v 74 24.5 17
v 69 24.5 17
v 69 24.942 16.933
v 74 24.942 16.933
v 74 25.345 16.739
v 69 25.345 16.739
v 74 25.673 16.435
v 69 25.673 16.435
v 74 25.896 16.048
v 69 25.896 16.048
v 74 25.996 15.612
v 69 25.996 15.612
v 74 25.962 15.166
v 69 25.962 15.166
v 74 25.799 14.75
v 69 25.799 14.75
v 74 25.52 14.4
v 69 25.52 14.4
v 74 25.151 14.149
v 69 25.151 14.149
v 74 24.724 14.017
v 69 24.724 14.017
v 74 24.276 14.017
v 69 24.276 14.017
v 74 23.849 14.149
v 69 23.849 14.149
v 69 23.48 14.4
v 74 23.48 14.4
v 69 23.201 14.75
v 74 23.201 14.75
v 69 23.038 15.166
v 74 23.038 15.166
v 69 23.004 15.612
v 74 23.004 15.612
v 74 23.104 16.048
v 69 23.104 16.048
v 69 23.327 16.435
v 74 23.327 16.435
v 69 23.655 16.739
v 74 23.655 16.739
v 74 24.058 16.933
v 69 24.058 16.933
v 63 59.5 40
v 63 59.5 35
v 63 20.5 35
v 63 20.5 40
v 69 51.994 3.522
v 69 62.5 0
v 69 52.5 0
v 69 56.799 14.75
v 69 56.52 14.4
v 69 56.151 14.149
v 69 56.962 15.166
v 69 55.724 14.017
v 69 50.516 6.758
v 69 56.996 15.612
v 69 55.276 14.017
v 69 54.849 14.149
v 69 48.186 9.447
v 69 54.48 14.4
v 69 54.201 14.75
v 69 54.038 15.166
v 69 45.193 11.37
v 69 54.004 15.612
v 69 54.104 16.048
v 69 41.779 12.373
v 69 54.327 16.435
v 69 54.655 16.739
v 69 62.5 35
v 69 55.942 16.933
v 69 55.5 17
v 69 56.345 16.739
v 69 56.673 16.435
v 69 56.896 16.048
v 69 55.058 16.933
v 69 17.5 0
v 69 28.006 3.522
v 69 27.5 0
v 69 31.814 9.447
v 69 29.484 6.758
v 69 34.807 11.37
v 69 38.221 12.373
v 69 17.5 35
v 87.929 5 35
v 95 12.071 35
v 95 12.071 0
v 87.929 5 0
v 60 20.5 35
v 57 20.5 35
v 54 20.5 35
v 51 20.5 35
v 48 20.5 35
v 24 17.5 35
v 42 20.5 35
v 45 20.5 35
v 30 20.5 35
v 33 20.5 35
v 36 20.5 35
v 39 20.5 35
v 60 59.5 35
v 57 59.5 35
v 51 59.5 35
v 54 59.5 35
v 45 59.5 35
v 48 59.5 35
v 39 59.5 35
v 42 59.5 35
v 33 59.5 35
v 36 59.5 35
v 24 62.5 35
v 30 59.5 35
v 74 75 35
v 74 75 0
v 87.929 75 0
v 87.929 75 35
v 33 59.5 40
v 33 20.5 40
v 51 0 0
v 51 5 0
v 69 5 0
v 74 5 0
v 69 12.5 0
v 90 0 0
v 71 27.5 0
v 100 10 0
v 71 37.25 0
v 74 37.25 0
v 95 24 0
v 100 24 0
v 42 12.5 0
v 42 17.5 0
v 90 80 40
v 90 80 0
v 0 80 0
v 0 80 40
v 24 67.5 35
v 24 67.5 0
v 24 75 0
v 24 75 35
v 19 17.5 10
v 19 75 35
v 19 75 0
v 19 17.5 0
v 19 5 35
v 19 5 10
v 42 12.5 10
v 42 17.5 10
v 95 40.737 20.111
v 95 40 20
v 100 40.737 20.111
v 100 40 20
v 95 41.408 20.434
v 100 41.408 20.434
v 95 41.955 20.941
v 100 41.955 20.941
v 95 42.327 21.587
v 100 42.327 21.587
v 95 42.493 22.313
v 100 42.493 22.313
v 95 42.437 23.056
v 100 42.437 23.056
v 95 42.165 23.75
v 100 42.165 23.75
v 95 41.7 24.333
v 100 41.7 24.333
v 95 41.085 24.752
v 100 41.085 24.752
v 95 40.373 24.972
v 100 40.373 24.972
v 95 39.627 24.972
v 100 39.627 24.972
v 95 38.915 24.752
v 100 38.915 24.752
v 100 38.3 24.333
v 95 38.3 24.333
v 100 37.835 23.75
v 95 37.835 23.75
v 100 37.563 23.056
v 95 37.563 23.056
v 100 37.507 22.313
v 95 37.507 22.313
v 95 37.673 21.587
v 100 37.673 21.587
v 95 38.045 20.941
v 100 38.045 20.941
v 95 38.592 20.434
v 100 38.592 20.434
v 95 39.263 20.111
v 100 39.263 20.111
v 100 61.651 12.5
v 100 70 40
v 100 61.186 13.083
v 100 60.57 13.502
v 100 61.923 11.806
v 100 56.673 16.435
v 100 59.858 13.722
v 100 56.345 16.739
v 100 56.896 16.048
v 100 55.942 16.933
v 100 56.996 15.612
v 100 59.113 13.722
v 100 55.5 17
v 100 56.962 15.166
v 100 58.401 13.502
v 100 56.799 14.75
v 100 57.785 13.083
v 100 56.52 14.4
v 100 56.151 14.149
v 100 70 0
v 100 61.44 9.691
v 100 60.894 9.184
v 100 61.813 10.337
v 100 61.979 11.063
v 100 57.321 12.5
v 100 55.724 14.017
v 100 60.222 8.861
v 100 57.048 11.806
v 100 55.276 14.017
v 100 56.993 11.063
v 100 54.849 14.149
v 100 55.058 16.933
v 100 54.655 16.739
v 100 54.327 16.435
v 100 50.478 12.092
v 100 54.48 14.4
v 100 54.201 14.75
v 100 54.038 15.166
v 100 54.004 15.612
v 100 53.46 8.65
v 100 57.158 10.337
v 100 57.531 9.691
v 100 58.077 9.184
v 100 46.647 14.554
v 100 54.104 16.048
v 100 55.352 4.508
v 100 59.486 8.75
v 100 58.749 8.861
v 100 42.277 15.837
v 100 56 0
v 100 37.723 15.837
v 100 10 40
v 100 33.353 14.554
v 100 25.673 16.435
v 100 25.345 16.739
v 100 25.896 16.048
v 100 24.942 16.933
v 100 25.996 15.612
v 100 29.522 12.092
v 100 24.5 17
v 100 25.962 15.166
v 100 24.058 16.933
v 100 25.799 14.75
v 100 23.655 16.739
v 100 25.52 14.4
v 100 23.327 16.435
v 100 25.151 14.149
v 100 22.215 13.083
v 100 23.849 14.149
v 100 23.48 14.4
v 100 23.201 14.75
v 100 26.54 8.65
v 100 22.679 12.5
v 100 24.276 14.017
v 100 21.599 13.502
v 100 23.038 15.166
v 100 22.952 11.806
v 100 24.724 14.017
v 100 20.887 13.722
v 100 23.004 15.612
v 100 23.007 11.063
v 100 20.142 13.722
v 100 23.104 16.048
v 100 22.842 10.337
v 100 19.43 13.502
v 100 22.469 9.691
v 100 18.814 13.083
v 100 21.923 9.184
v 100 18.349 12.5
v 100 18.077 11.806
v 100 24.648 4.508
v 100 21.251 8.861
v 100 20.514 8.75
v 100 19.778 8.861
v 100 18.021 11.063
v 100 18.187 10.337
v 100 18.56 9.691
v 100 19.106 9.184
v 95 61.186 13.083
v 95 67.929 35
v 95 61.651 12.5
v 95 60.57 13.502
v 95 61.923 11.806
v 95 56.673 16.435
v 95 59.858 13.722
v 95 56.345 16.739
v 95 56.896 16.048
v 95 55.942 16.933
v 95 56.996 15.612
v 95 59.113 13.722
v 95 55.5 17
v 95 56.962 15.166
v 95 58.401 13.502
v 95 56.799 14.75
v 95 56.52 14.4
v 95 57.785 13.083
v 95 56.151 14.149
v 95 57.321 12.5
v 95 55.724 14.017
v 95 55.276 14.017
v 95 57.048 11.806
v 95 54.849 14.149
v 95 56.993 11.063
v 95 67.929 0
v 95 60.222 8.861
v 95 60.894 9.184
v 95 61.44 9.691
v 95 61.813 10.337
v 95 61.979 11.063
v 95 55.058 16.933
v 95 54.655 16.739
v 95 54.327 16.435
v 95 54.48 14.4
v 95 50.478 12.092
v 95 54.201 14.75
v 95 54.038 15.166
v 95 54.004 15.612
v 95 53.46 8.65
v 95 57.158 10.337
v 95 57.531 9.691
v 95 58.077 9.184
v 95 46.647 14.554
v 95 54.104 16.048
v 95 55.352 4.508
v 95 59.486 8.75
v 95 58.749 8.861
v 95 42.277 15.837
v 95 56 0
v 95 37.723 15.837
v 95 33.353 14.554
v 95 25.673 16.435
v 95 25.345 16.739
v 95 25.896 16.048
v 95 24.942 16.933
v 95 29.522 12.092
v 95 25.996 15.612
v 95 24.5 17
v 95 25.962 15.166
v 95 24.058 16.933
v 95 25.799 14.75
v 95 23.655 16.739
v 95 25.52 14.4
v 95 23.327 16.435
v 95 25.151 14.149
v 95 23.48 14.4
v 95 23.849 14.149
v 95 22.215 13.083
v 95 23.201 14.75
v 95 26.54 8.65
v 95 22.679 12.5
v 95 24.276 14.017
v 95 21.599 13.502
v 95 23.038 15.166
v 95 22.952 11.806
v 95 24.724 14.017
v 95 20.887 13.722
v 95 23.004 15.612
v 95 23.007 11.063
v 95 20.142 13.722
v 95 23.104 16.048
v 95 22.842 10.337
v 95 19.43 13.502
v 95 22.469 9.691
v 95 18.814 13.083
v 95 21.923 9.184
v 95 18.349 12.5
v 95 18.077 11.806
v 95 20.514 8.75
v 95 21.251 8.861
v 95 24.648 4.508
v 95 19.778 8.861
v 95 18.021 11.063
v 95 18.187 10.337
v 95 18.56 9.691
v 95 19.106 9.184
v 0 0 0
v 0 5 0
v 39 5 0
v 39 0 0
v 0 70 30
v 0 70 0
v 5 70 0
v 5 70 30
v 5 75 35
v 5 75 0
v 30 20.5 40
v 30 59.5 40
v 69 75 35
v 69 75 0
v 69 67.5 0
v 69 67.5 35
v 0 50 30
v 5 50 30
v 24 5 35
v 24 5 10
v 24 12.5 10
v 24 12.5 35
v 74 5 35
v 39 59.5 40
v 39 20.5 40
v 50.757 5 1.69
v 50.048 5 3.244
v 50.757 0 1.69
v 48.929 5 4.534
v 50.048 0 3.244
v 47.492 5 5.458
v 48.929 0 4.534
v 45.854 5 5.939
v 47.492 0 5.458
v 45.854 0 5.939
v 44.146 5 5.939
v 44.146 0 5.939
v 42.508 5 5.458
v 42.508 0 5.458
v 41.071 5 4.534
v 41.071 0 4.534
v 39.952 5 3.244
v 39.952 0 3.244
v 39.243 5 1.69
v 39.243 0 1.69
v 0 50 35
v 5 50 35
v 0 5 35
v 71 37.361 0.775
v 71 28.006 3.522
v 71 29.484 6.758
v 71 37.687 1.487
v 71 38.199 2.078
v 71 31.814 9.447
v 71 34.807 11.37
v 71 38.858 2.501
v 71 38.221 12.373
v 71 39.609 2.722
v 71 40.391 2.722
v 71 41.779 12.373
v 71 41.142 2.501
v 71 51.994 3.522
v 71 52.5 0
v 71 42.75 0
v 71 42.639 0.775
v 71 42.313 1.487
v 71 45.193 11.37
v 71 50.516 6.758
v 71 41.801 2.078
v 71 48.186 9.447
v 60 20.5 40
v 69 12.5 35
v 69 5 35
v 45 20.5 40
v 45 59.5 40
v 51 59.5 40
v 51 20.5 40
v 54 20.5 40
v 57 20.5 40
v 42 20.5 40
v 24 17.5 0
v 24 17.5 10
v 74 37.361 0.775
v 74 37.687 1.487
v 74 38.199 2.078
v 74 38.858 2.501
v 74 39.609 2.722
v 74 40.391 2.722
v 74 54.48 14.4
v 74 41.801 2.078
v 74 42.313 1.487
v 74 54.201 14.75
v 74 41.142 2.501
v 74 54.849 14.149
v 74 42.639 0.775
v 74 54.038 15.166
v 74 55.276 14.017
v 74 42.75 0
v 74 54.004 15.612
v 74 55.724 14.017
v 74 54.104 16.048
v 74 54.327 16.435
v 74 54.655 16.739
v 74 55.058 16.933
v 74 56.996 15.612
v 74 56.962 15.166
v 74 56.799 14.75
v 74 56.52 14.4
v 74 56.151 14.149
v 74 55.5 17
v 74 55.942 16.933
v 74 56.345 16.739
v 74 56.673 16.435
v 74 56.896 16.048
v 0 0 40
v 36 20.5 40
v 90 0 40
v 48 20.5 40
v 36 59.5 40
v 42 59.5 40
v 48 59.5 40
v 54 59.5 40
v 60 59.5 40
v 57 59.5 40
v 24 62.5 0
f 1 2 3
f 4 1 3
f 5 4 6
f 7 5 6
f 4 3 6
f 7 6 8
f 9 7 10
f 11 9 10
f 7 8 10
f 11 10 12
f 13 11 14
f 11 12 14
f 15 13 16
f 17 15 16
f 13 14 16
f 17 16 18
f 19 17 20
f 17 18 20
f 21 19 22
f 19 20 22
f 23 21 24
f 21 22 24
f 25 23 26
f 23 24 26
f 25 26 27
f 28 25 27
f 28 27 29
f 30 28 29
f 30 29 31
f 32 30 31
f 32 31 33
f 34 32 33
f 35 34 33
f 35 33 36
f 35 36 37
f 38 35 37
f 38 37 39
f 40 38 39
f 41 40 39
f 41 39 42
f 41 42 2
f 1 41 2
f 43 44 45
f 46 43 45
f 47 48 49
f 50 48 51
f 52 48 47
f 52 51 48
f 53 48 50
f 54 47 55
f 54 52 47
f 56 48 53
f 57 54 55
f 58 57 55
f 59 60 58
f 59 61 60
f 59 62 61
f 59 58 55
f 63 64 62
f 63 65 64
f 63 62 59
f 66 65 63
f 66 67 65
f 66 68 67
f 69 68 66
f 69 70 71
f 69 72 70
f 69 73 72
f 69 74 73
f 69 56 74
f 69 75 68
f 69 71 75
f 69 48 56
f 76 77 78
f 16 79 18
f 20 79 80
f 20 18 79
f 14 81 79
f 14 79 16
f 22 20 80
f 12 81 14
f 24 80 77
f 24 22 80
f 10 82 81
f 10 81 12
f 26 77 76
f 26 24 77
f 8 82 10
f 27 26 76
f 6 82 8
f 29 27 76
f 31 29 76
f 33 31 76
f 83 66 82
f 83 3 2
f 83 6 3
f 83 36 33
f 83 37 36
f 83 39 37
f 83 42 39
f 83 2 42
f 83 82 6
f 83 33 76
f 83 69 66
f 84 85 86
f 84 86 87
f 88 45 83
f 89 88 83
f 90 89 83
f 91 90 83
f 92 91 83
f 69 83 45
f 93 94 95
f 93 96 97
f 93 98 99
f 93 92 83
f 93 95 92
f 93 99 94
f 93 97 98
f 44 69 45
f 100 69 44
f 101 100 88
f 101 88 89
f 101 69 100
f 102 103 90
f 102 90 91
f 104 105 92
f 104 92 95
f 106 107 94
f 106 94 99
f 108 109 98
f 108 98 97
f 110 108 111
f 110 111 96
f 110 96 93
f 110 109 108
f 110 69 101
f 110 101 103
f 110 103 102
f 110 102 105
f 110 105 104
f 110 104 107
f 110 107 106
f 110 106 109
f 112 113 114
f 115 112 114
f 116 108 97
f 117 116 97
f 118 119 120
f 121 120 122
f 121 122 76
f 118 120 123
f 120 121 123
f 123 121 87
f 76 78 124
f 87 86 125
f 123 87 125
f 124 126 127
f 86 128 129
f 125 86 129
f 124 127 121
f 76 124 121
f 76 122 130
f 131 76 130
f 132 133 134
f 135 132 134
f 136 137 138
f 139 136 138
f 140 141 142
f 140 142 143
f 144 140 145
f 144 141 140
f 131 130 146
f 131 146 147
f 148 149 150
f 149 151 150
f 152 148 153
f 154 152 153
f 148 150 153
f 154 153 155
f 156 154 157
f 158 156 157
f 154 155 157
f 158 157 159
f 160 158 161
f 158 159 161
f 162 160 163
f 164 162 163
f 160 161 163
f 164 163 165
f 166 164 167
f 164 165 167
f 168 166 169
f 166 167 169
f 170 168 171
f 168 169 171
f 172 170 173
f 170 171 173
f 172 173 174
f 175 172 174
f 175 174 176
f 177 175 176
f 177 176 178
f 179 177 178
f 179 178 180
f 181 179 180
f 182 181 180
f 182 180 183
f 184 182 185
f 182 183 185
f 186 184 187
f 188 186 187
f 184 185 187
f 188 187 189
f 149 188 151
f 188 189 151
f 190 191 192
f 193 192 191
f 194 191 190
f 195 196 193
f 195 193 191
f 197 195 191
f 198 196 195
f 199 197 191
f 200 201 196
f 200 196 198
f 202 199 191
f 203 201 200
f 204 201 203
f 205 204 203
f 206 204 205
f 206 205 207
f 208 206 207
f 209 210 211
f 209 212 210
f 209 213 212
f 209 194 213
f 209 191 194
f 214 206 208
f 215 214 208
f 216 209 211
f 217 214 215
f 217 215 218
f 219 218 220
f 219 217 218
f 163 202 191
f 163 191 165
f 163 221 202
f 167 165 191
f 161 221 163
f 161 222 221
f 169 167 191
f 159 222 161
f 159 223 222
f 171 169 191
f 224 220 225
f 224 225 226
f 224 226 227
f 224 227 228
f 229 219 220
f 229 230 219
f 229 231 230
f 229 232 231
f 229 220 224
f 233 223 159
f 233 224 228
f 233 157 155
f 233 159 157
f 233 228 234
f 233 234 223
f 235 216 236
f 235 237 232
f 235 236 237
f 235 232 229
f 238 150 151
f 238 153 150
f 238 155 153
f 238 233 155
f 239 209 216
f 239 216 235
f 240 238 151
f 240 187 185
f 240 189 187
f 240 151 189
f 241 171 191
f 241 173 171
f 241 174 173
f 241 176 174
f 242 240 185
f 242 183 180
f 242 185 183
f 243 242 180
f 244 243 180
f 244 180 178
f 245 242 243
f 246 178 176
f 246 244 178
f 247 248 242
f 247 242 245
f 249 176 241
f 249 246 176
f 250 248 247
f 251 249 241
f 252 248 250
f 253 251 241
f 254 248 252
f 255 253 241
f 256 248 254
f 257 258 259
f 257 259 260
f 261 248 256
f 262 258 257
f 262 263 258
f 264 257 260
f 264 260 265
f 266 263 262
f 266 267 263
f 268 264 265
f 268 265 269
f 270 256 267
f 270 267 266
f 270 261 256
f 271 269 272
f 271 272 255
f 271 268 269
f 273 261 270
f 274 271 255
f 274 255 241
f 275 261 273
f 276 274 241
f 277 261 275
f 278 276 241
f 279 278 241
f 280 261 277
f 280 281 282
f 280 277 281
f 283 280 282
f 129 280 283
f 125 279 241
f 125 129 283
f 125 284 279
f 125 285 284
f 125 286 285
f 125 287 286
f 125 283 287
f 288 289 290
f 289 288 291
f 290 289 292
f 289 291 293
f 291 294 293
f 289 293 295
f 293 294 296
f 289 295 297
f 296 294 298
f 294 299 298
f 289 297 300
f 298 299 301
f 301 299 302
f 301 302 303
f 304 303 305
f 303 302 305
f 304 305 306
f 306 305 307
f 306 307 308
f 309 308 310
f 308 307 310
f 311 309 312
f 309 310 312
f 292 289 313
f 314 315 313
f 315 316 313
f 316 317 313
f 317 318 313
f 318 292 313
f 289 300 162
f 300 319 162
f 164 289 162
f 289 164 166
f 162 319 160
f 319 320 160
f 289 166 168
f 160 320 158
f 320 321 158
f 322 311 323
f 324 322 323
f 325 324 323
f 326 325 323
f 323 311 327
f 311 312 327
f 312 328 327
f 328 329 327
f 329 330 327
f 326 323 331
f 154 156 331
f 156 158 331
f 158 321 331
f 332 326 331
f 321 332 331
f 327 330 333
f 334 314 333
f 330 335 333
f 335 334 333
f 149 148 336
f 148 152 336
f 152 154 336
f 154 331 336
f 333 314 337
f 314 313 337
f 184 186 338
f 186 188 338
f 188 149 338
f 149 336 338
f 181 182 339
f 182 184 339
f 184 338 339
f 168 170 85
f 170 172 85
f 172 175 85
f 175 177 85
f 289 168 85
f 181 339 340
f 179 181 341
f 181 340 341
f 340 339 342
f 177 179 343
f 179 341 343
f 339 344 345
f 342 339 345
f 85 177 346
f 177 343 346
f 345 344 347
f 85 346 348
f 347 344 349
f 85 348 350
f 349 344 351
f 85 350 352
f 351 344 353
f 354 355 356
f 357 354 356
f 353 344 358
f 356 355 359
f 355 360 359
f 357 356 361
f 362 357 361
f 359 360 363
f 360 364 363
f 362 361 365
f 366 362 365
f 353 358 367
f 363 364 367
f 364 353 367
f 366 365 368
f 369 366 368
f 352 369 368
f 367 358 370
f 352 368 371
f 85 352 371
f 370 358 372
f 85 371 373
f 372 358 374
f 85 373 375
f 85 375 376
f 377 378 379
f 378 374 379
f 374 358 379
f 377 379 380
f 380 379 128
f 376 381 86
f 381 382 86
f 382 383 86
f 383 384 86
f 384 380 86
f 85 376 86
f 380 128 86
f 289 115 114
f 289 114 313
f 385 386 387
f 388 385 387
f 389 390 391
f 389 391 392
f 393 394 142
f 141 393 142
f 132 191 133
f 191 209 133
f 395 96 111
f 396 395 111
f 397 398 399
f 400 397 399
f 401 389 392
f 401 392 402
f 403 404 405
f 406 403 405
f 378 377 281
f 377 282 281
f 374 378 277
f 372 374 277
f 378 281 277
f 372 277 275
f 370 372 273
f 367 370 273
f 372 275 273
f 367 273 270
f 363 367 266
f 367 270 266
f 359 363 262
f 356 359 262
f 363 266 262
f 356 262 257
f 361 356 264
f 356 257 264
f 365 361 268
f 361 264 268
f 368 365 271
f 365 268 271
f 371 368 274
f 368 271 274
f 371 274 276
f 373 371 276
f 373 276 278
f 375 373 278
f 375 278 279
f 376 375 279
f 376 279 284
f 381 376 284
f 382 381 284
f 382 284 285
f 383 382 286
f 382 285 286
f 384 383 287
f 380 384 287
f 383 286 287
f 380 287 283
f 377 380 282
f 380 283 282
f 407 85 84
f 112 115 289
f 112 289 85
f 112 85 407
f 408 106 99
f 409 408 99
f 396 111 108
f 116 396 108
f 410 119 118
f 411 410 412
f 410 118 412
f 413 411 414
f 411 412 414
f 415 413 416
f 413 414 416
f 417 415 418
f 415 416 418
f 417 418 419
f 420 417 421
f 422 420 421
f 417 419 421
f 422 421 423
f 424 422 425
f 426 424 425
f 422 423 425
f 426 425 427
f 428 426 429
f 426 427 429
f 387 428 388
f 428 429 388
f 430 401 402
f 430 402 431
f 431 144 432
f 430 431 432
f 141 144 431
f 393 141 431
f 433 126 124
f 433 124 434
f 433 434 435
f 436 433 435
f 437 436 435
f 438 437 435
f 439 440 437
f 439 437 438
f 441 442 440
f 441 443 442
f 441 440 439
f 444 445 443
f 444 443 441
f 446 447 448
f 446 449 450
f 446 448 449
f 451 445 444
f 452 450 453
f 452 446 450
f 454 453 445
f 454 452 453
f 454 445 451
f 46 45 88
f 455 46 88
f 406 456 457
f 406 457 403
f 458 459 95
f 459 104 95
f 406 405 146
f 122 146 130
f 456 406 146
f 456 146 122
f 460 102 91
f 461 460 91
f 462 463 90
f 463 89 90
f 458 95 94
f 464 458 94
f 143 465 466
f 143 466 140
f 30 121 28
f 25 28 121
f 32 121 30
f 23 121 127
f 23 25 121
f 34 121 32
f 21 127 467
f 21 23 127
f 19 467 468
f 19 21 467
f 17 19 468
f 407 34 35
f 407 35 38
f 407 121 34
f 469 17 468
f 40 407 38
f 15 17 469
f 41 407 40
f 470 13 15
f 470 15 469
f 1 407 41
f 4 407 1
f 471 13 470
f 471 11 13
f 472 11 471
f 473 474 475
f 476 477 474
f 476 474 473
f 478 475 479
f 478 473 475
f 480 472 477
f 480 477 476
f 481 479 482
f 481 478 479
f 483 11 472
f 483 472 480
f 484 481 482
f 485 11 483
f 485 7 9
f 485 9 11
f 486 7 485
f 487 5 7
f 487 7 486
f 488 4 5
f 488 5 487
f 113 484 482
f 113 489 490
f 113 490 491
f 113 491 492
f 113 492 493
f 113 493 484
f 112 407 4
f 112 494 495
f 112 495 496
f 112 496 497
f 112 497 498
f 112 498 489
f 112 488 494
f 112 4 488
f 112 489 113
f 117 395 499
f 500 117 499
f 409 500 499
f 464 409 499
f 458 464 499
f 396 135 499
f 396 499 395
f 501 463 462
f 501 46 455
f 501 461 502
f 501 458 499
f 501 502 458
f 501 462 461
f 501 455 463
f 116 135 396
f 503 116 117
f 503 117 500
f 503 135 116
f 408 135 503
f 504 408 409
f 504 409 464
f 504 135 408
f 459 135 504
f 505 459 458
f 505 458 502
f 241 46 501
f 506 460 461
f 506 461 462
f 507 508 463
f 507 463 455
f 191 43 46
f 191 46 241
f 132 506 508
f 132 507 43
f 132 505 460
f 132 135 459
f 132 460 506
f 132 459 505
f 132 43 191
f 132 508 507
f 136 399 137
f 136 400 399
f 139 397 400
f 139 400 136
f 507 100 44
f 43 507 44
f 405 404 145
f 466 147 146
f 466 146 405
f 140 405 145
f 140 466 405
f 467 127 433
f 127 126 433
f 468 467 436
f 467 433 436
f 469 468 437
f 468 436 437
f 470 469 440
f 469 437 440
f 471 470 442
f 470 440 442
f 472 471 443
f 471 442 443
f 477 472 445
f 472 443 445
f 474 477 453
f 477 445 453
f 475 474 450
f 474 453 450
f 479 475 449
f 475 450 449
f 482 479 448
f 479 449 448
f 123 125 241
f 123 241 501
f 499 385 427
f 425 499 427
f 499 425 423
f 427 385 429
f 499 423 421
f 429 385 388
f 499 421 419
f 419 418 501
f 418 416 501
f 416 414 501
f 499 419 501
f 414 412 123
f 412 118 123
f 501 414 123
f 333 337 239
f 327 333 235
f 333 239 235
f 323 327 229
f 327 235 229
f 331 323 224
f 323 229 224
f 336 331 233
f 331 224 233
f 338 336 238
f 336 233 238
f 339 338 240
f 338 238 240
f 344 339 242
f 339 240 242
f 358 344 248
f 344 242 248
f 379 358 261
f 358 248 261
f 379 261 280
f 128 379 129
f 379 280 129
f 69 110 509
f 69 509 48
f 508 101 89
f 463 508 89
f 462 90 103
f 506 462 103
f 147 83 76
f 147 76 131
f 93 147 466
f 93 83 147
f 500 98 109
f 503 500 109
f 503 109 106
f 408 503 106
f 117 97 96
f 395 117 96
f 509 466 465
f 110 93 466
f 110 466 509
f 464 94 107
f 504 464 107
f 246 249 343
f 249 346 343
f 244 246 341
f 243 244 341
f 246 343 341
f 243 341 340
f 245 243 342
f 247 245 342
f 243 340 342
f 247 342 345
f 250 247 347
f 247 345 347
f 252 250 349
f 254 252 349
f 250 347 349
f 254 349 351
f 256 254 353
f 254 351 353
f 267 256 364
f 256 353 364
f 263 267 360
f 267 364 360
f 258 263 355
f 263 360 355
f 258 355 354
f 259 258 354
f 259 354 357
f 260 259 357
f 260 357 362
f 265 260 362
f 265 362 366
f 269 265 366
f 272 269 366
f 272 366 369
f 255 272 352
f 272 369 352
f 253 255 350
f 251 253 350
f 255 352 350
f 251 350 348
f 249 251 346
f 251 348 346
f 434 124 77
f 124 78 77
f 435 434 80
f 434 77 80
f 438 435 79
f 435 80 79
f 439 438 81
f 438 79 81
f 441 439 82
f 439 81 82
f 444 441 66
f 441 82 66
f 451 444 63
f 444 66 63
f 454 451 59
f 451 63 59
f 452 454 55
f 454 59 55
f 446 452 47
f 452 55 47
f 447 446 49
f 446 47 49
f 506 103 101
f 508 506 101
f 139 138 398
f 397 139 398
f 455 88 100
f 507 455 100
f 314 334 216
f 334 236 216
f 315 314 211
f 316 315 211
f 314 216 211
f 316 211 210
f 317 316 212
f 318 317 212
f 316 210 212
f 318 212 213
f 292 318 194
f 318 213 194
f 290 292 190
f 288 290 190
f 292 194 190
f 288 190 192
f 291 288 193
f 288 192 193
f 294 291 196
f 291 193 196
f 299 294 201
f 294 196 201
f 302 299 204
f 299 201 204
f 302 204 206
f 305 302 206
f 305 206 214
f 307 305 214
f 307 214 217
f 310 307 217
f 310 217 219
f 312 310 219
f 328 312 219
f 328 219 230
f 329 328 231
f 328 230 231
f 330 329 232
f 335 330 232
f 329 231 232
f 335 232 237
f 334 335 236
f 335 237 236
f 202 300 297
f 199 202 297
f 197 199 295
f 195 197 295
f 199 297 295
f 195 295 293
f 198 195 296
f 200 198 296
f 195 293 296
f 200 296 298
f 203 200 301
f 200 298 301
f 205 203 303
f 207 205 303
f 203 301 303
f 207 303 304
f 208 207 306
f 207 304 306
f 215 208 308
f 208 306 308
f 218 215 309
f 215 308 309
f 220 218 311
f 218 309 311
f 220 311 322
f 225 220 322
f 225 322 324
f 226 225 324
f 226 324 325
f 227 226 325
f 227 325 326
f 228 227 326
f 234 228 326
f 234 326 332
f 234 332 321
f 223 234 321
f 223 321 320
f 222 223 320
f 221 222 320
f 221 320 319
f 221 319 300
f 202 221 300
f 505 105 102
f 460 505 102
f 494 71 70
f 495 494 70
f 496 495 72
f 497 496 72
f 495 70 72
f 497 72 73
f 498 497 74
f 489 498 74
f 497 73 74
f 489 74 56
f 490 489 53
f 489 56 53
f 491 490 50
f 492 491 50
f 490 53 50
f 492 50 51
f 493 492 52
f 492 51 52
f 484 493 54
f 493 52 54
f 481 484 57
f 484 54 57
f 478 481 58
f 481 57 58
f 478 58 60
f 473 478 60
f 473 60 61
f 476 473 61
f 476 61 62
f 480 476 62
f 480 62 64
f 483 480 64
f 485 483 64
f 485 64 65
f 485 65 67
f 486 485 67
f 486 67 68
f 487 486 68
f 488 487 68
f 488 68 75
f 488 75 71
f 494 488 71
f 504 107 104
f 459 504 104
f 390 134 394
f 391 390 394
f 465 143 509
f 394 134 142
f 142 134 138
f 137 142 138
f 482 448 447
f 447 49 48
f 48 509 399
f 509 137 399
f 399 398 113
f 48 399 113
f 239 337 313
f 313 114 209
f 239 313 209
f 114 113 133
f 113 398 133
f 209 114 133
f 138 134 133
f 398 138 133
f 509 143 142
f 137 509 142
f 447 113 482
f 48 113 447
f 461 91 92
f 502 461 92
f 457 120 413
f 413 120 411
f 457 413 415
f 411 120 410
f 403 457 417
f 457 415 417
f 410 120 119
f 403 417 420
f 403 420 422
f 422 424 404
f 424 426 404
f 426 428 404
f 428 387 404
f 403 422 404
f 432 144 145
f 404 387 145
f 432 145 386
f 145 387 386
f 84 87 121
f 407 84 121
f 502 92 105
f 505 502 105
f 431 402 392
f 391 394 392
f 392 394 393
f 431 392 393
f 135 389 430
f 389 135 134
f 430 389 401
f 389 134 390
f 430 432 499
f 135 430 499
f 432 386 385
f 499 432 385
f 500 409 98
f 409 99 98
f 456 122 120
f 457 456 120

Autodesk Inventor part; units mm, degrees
ref_plane "YZ Plane" through (0, 0, 0) normal (1, 0, 0) x (0, 1, 0)
ref_plane "XZ Plane" through (0, 0, 0) normal (0, 1, 0) x (-1, 0, 0)
ref_plane "XY Plane" through (0, 0, 0) normal (0, 0, 1) x (1, 0, 0)
sketch "Sketch1" plane through (0, 0, 0) normal (0, 0, 1) x (1, 0, 0)
  line L0 (0, 0) -> (100, 0)
  line L1 (100, 0) -> (100, 80) construction
  line L2 (100, 80) -> (0, 80)
  line L3 (0, 80) -> (0, 0)
  line L4 (100, 70) -> (90, 80)
  line L5 (100, 10) -> (90, 0)
  line L6 (100, 70) -> (100, 10)
  dimension "d0" = 100
  dimension "d1" = 80
  dimension "d23" = 10
  dimension "d24" = 10
  dimension "d25" = 10
  dimension "d26" = 10
extrude "Extrusion1" add sketch "Sketch1" along normal blind 40
sketch "Sketch4" plane through (0, 0, 0) normal (0, 0, -1) x (-1, 0, 0)
  line L0 (-90, 80) -> (0, 80) projected
  line L1 (0, 0) -> (-90, 0) projected
  line L2 (-100, 70) -> (-90, 80) projected
  line L3 (-100, 10) -> (-100, 70) projected
  line L4 (-90, 0) -> (-100, 10) projected
  line L5 (0, 75) -> (-87.9289, 75)
  line L6 (-87.9289, 75) -> (-95, 67.9289)
  line L7 (-95, 67.9289) -> (-95, 12.0711)
  line L8 (-95, 12.0711) -> (-87.9289, 5)
  line L9 (-87.9289, 5) -> (0, 5)
  line L10 (0, 75) -> (0, 5)
  line L11 (0, 80) -> (0, 0) projected
  dimension "d27" = 5
extrude "Extrusion4" cut sketch "Sketch4" against normal blind 35 contours L10 L9 L8 L7 L6 L5
sketch "Sketch5" plane through (0, 0, 40) normal (-1, 0, 0) x (0, 0, 1)
  line L0 (0, 0) -> (0, 80)
  line L1 (-40, 5) -> (-40, 75)
  line L2 (0, 80) -> (-40, 80)
  line L3 (-40, 80) -> (-40, 70)
  line L4 (-40, 70) -> (0, 70)
  line L5 (0, 70) -> (0, 80)
  line L6 (0, 80) -> (-10, 80)
  line L7 (-10, 80) -> (-10, 50)
  line L8 (-10, 50) -> (0, 50)
  line L9 (0, 50) -> (0, 80)
  line L10 (-40, 0) -> (0, 0)
  dimension "d15" = 10
  dimension "d16" = 10
  dimension "d17" = 50
extrude "Extrusion5" add sketch "Sketch5" against normal blind 5
sketch "Sketch6" plane through (100, 10, 0) normal (1, 0, 0) x (0, 0, -1)
  circle A0 centre (0, 30) radius 16
  line L0 (0, 0) -> (0, 60) projected
  dimension "d20" = 32
extrude "Extrusion6" cut sketch "Sketch6" against normal through all
sketch "Sketch7" plane through (0, 0, 35) normal (0, 0, -1) x (-1, 0, 0)
  line L0 (-87.9289, 75) -> (-5, 75) projected
  line L1 (0, 5) -> (-87.9289, 5) projected
  line L2 (-74, 75) -> (-69, 75)
  line L3 (-69, 75) -> (-69, 5)
  line L4 (-69, 5) -> (-74, 5)
  line L5 (-74, 5) -> (-74, 75)
  line L6 (-95, 56) -> (-95, 67.9289) projected
  line L7 (-24, 75) -> (-19, 75)
  line L8 (-19, 75) -> (-19, 5)
  line L9 (-19, 5) -> (-24, 5)
  line L10 (-24, 5) -> (-24, 75)
  line L11 (-69, 67.5) -> (-24, 67.5)
  line L12 (-24, 67.5) -> (-24, 62.5)
  line L13 (-24, 62.5) -> (-69, 62.5)
  line L14 (-69, 62.5) -> (-69, 67.5)
  line L15 (-69, 17.5) -> (-24, 17.5)
  line L16 (-24, 17.5) -> (-24, 12.5)
  line L17 (-24, 12.5) -> (-69, 12.5)
  line L18 (-69, 12.5) -> (-69, 17.5)
  line L19 (-46.5, 67.5) -> (-46.5, 12.5) construction
  point P0 (0, 0)
  point P1 (-46.5, 40)
  point P2 (-69, 40)
  dimension "d28" = 5
  dimension "d29" = 21
  dimension "d30" = 5
  dimension "d31" = 45
  dimension "d32" = 5
  dimension "d33" = 5
  dimension "d34" = 45
extrude "Extrusion7" add sketch "Sketch7" along normal blind 35 contours L0 L3 L1 L5 | L0 L8 L1 L10 | L11 L10 L13 L3 | L3 L15 L10 L17
sketch "Sketch8" plane through (0, 0, 0) normal (0, 0, -1) x (-1, 0, 0)
  line L0 (-19, 5) -> (-19, 75) projected
  line L1 (-69, 17.5) -> (-24, 17.5) projected
  line L2 (-19, 5) -> (-42, 5)
  line L3 (-42, 5) -> (-42, 17.5)
  line L4 (-42, 17.5) -> (-19, 17.5)
  line L5 (-19, 17.5) -> (-19, 5)
  point P0 (0, 0)
  dimension "d37" = 23
extrude "Extrusion8" cut sketch "Sketch8" against normal blind 10
sketch "Sketch9" plane through (69, 17.5, 35) normal (-1, 0, 0) x (0, 0, 1)
  line L0 (-35, 0) -> (-35, 45) projected
  circle A0 centre (-35, 22.5) radius 2.75
  line L1 (-50.5, 7) -> (-19.5, 7) construction
  line L2 (-19.5, 7) -> (-19.5, 38) construction
  line L3 (-19.5, 38) -> (-50.5, 38) construction
  line L4 (-50.5, 38) -> (-50.5, 7) construction
  line L5 (-50.5, 7) -> (-19.5, 38) construction
  line L6 (-19.5, 7) -> (-50.5, 38) construction
  circle A1 centre (-19.5, 38) radius 1.5
  circle A2 centre (-19.5, 7) radius 1.5
  point P0 (-35, -17.5)
  dimension "d40" = 5.5
  dimension "d41" = 31
  dimension "d42" = 31
  dimension "d43" = 3
  dimension "d44" = 3
extrude "Extrusion9" cut sketch "Sketch9" against normal through all
sketch "Sketch10" plane through (0, 0, 35) normal (0, 0, -1) x (-1, 0, 0)
  line L0 (-30, 59.5) -> (-33, 59.5)
  line L1 (-33, 59.5) -> (-33, 20.5)
  line L2 (-33, 20.5) -> (-30, 20.5)
  line L3 (-30, 20.5) -> (-30, 59.5)
  line L4 (-24, 62.5) -> (-24, 17.5) projected
  line L5 (-69, 62.5) -> (-24, 62.5) projected
  line L6 (-24, 17.5) -> (-19, 17.5) projected
  line L7 (-36, 59.5) -> (-39, 59.5)
  line L8 (-39, 59.5) -> (-39, 20.5)
  line L9 (-39, 20.5) -> (-36, 20.5)
  line L10 (-36, 20.5) -> (-36, 59.5)
  line L11 (-42, 59.5) -> (-45, 59.5)
  line L12 (-45, 59.5) -> (-45, 20.5)
  line L13 (-45, 20.5) -> (-42, 20.5)
  line L14 (-42, 20.5) -> (-42, 59.5)
  line L15 (-48, 59.5) -> (-51, 59.5)
  line L16 (-51, 59.5) -> (-51, 20.5)
  line L17 (-51, 20.5) -> (-48, 20.5)
  line L18 (-48, 20.5) -> (-48, 59.5)
  line L19 (-54, 59.5) -> (-57, 59.5)
  line L20 (-57, 59.5) -> (-57, 20.5)
  line L21 (-57, 20.5) -> (-54, 20.5)
  line L22 (-54, 20.5) -> (-54, 59.5)
  line L23 (-60, 59.5) -> (-63, 59.5)
  line L24 (-63, 59.5) -> (-63, 20.5)
  line L25 (-63, 20.5) -> (-60, 20.5)
  line L26 (-60, 20.5) -> (-60, 59.5)
  point P0 (0, 0)
  dimension "d47" = 3
  dimension "d49" = 6
  dimension "d50" = 3
  dimension "d51" = 3
  dimension "d54" = 6
extrude "Extrusion10" cut sketch "Sketch10" against normal through all
sketch "Sketch11" plane through (0, 0, 0) normal (0, -1, 0) x (1, 0, 0)
  circle A0 centre (45, 0) radius 6
  line L0 (0, 0) -> (90, 0) projected
  dimension "d61" = 12
extrude "Extrusion11" cut sketch "Sketch11" against normal blind 5
sketch "Sketch12" plane through (69, 17.5, 35) normal (-1, 0, 0) x (0, 0, 1)
  arc A0 (-35, 19.75) -> (-35, 25.25) centre (-35, 22.5) ccw projected
  circle A1 centre (-35, 22.5) radius 12.5
  point P0 (-35, -17.5)
  dimension "d64" = 25
extrude "Extrusion12" cut sketch "Sketch12" against normal blind 2
sketch "Sketch13" plane through (100, 10, 40) normal (1, 0, 0) x (0, 0, -1)
  arc A0 (40, 46) -> (40, 14) centre (40, 30) ccw projected
  circle A1 centre (17.5, 30) radius 2.5
  circle A2 centre (28.75, 10.5144) radius 2.5
  circle A3 centre (51.25, 10.5144) radius 2.5
  circle A4 centre (62.5, 30) radius 2.5
  circle A5 centre (51.25, 49.4856) radius 2.5
  circle A6 centre (28.75, 49.4856) radius 2.5
  point P0 (40, -10)
  dimension "d67" = 5
  dimension "d68" = 22.5
  dimension "d71" = 360
extrude "Extrusion13" cut sketch "Sketch13" against normal blind 10 contours A1 | A2 | A6
properties part number "FA002" material "ABS Plastic"
